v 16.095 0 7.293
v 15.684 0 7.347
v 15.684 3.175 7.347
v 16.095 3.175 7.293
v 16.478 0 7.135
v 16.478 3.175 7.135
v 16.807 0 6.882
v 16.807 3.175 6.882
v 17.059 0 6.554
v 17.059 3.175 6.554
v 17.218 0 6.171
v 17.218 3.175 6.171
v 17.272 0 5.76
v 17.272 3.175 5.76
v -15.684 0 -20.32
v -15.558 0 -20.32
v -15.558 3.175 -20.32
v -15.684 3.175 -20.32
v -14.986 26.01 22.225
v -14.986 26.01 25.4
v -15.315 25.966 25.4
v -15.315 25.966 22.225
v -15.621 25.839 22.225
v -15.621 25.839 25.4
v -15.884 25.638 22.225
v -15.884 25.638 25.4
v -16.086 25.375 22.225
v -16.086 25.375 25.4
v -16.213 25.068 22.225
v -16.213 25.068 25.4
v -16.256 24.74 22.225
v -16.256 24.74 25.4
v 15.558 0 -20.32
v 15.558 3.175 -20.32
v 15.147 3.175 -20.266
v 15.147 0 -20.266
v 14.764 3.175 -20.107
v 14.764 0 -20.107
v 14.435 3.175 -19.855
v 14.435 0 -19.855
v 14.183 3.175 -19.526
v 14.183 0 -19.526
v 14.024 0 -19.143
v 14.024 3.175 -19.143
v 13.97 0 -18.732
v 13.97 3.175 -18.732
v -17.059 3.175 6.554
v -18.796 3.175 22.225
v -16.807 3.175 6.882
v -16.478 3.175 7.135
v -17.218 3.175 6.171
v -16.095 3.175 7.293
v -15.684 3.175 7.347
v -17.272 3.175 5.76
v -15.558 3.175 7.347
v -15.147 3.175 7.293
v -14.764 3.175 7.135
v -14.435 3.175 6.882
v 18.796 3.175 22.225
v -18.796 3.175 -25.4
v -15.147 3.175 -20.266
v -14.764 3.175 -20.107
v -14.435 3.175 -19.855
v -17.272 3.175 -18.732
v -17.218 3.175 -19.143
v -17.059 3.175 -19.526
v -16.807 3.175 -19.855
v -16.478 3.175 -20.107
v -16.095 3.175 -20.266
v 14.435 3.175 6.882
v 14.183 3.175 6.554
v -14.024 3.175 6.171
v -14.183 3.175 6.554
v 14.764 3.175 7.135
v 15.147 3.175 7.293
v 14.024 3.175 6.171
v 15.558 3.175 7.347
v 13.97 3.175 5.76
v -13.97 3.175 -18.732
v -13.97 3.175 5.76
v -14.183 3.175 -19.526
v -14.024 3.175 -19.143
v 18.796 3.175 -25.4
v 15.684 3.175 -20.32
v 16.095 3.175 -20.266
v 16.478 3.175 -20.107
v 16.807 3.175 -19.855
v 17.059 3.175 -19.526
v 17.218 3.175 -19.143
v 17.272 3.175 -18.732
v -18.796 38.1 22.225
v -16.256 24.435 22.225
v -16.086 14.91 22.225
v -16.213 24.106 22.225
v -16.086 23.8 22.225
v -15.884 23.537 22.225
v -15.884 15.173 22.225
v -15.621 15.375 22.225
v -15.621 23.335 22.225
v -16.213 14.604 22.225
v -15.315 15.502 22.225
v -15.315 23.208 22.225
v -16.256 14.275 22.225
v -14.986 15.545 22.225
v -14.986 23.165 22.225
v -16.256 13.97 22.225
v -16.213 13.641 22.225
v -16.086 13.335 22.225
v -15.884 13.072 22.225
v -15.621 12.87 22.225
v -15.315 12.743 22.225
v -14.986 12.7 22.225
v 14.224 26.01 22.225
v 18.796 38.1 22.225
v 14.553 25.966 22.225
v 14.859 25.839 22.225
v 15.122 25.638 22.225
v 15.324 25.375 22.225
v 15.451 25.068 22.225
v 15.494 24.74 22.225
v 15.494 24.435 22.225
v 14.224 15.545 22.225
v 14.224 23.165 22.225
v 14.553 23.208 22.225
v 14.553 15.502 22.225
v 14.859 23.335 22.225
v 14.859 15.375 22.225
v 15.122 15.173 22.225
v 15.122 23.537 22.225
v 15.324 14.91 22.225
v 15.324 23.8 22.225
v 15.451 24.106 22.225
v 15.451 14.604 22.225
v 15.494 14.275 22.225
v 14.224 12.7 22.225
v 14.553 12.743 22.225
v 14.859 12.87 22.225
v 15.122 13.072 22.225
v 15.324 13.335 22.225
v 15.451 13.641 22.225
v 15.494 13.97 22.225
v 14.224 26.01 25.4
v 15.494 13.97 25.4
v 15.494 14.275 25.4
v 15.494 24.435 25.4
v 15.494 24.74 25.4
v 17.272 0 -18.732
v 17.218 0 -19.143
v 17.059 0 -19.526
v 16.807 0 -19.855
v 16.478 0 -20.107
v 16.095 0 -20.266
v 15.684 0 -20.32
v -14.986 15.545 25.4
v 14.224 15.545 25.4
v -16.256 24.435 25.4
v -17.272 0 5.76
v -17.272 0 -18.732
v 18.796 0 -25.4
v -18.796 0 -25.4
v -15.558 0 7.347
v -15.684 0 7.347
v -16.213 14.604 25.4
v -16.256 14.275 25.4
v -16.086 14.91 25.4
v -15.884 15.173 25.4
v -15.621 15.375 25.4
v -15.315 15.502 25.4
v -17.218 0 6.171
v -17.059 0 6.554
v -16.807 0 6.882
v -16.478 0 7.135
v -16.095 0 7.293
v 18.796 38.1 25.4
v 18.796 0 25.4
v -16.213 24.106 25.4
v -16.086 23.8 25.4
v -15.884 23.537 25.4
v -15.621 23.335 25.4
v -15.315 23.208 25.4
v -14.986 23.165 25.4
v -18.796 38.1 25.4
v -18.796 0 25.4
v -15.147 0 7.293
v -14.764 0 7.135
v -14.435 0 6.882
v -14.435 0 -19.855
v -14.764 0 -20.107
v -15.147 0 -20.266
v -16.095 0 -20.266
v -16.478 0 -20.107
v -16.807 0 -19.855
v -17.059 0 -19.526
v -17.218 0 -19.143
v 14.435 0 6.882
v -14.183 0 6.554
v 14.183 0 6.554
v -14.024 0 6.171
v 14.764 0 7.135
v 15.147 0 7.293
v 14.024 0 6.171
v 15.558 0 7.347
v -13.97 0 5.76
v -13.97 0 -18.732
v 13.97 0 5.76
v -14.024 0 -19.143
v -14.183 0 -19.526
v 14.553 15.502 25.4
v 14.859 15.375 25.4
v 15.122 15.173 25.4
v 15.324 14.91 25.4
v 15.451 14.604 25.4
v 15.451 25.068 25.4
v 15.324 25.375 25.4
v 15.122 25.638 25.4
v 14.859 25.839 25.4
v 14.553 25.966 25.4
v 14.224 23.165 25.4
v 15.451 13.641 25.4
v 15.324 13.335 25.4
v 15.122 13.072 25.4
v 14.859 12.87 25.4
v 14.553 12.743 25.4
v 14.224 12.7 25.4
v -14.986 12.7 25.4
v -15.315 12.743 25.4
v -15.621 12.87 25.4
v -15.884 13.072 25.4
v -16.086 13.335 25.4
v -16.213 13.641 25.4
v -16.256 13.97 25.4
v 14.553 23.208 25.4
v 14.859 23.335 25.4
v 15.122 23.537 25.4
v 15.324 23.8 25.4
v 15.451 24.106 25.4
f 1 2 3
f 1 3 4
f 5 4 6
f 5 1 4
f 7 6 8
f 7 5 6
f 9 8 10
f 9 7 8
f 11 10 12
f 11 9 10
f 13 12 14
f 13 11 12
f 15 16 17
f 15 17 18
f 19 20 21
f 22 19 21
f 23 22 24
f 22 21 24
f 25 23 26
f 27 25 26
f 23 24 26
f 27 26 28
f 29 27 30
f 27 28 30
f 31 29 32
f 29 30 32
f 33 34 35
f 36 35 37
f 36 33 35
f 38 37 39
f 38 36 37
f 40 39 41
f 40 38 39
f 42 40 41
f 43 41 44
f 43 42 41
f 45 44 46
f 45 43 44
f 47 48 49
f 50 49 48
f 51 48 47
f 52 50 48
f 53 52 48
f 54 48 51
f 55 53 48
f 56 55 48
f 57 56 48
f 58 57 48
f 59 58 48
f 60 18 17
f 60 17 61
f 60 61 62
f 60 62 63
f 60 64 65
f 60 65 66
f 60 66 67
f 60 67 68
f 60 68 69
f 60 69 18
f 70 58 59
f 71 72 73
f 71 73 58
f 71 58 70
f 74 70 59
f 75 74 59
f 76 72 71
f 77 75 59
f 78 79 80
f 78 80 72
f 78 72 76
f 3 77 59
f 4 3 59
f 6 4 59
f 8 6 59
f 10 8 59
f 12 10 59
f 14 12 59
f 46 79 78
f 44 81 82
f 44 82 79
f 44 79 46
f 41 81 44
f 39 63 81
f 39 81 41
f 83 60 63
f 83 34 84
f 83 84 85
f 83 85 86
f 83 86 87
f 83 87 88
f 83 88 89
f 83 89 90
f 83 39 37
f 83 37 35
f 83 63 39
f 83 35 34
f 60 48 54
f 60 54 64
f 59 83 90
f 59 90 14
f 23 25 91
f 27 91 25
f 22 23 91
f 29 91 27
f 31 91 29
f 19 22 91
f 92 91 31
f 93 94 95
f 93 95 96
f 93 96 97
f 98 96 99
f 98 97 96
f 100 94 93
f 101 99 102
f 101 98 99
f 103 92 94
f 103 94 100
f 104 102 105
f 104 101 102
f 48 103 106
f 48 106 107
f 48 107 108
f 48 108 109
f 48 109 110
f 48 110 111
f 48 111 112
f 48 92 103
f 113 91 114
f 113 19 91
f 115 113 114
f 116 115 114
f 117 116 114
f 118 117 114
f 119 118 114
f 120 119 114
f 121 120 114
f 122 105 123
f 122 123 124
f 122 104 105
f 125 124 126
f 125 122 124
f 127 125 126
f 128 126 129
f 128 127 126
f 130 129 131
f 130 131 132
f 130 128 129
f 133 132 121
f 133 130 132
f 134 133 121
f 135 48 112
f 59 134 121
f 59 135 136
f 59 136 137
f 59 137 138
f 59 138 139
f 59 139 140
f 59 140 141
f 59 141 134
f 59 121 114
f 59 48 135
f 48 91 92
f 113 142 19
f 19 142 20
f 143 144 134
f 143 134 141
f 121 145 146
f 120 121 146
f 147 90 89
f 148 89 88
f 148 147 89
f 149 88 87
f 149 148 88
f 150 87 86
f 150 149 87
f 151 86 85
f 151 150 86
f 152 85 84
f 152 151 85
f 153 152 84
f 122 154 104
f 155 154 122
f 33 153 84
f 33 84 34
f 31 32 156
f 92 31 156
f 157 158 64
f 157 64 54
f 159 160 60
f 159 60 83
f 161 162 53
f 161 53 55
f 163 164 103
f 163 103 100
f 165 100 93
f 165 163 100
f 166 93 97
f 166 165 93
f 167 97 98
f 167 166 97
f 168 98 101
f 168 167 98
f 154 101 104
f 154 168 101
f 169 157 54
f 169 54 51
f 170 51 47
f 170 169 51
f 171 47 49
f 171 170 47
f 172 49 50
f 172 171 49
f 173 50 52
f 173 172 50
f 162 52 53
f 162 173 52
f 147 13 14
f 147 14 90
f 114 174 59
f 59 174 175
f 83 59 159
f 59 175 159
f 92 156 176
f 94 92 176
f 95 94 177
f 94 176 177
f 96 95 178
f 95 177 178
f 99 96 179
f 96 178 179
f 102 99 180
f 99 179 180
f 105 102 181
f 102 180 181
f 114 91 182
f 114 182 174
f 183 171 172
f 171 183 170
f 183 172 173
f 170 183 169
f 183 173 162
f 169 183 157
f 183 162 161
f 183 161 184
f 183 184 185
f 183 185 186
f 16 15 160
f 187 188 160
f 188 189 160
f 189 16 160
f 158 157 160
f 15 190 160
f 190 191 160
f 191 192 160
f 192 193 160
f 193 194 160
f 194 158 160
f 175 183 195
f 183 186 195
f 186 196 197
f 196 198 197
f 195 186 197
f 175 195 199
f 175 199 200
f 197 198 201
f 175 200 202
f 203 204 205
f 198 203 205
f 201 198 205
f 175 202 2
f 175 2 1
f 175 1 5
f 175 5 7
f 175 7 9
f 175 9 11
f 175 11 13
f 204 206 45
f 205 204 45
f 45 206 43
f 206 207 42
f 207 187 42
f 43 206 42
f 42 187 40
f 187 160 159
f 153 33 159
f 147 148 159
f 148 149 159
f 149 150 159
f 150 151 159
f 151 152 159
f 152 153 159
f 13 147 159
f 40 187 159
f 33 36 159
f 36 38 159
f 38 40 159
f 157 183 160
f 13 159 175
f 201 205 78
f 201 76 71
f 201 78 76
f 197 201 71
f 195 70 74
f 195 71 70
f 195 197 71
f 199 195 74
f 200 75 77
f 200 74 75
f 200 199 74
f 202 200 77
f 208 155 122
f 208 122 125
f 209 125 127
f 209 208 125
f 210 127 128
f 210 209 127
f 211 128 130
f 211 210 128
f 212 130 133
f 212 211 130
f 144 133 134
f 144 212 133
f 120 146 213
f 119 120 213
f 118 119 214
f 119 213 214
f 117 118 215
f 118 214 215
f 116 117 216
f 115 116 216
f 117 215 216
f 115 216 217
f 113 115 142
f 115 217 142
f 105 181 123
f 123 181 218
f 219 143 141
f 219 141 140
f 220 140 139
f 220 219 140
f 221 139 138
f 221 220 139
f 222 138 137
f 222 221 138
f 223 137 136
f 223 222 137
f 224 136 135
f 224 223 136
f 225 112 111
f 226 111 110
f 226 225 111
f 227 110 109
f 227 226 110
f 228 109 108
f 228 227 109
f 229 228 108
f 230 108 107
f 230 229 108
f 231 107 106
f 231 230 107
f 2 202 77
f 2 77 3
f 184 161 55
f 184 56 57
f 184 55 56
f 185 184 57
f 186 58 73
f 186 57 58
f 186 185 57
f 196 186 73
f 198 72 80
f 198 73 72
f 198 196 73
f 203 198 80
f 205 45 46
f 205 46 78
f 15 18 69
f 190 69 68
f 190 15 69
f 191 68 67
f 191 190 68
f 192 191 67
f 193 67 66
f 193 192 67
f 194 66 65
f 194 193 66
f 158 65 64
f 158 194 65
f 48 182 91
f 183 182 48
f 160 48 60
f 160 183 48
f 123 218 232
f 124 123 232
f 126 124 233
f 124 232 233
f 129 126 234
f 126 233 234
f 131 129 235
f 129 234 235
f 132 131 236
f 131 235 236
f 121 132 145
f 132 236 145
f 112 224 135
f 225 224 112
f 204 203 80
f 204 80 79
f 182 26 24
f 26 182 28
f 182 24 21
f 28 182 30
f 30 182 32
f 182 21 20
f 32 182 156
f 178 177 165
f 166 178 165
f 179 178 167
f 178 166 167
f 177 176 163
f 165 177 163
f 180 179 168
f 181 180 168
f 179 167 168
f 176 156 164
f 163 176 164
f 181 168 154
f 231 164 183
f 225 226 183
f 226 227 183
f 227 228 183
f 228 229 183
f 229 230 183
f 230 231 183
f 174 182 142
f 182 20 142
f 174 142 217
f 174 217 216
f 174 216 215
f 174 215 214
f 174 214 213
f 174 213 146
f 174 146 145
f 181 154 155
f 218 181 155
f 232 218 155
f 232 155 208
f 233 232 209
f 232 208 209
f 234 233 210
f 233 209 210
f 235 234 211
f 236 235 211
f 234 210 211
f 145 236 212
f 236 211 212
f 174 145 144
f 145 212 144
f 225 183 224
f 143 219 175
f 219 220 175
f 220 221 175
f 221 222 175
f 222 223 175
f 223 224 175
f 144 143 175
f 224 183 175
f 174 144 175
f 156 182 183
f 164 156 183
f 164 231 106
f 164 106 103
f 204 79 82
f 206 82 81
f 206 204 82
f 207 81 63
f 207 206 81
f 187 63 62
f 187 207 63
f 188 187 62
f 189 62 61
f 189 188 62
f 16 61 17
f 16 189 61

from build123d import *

# Parameters (mm, degrees)
SKETCH1_W           = 37.592
SKETCH1_H           = 50.8
BOSS_EXTRUDE1_DEPTH = 3.175
SKETCH2_W           = 37.592
SKETCH2_H           = 3.175
BOSS_EXTRUDE2_DEPTH = 34.925
CUT_EXTRUDE1_REACH  = 52.8
CUT_EXTRUDE2_REACH  = 40.1


with BuildPart() as part:
    # Sketch1 → Boss-Extrude1 (new body)
    with BuildSketch(Plane(origin=(0, 0, 0), x_dir=(1, 0, 0), z_dir=(0, 1, 0))):
        Rectangle(SKETCH1_W, SKETCH1_H)
    extrude(amount=BOSS_EXTRUDE1_DEPTH)

    # Sketch2 → Boss-Extrude2 (add)
    with BuildSketch(Plane(origin=(0, 3.175, 0), x_dir=(1, 0, 0), z_dir=(0, 1, 0))):
        with Locations((0, -23.8125)):
            Rectangle(SKETCH2_W, SKETCH2_H)
    extrude(amount=BOSS_EXTRUDE2_DEPTH)

    # Sketch3 → Cut-Extrude1 (cut, up to next)
    with BuildSketch(Plane.XY.offset(25.4), mode=Mode.PRIVATE) as cut_extrude1_sk1:
        with BuildLine():
            Line((14.224, 12.7), (-14.986, 12.7))
            ThreePointArc((-14.986, 12.7), (-15.884025612, 13.071974388), (-16.256, 13.97))
            Line((-16.256, 13.97), (-16.256, 14.2748))
            ThreePointArc((-16.256, 14.2748), (-15.884025612, 15.172825612), (-14.986, 15.5448))
            Line((-14.986, 15.5448), (14.224, 15.5448))
            ThreePointArc((14.224, 15.5448), (15.122025612, 15.172825612), (15.494, 14.2748))
            Line((15.494, 14.2748), (15.494, 13.97))
            ThreePointArc((15.494, 13.97), (15.122025612, 13.071974388), (14.224, 12.7))
        make_face()
    cut_extrude1_tool1 = extrude(cut_extrude1_sk1.sketch, amount=-CUT_EXTRUDE1_REACH, mode=Mode.PRIVATE) & part.part
    add(cut_extrude1_tool1.solids().sort_by_distance((-0.381, 14.1224, 25.4))[0], mode=Mode.SUBTRACT)
    # Sketch3 → Cut-Extrude1 (cut, up to next)
    with BuildSketch(Plane.XY.offset(25.4), mode=Mode.PRIVATE) as cut_extrude1_sk2:
        with BuildLine():
            Line((-14.986, 23.1648), (14.224, 23.1648))
            ThreePointArc((14.224, 23.1648), (15.122025612, 23.536774388), (15.494, 24.4348))
            Line((15.494, 24.4348), (15.494, 24.7396))
            ThreePointArc((15.494, 24.7396), (15.122025612, 25.637625612), (14.224, 26.0096))
            Line((14.224, 26.0096), (-14.986, 26.0096))
            ThreePointArc((-14.986, 26.0096), (-15.884025612, 25.637625612), (-16.256, 24.7396))
            Line((-16.256, 24.7396), (-16.256, 24.4348))
            ThreePointArc((-16.256, 24.4348), (-15.884025612, 23.536774388), (-14.986, 23.1648))
        make_face()
    cut_extrude1_tool2 = extrude(cut_extrude1_sk2.sketch, amount=-CUT_EXTRUDE1_REACH, mode=Mode.PRIVATE) & part.part
    add(cut_extrude1_tool2.solids().sort_by_distance((-0.381, 24.5872, 25.4))[0], mode=Mode.SUBTRACT)

    # Sketch4 → Cut-Extrude2 (cut, up to next)
    with BuildSketch(Plane.XZ, mode=Mode.PRIVATE) as cut_extrude2_sk1:
        with BuildLine():
            Line((-15.5575, -20.32), (-15.6845, -20.32))
            ThreePointArc((-15.6845, -20.32), (-16.807032015, -19.855032015), (-17.272, -18.7325))
            Line((-17.272, -18.7325), (-17.272, 5.759956222))
            ThreePointArc((-17.272, 5.759956222), (-16.807032015, 6.882488237), (-15.6845, 7.347456222))
            Line((-15.6845, 7.347456222), (-15.5575, 7.347456222))
            ThreePointArc((-15.5575, 7.347456222), (-14.434967985, 6.882488237), (-13.97, 5.759956222))
            Line((-13.97, 5.759956222), (-13.97, -18.7325))
            ThreePointArc((-13.97, -18.7325), (-14.434967985, -19.855032015), (-15.5575, -20.32))
        make_face()
    cut_extrude2_tool1 = extrude(cut_extrude2_sk1.sketch, amount=-CUT_EXTRUDE2_REACH, mode=Mode.PRIVATE) & part.part
    add(cut_extrude2_tool1.solids().sort_by_distance((-15.621, 0, -6.486272))[0], mode=Mode.SUBTRACT)
    # Sketch4 → Cut-Extrude2 (cut, up to next)
    with BuildSketch(Plane.XZ, mode=Mode.PRIVATE) as cut_extrude2_sk2:
        with BuildLine():
            Line((15.6845, -20.32), (15.5575, -20.32))
            ThreePointArc((15.5575, -20.32), (14.434967985, -19.855032015), (13.97, -18.7325))
            Line((13.97, -18.7325), (13.97, 5.759956222))
            ThreePointArc((13.97, 5.759956222), (14.434967985, 6.882488237), (15.5575, 7.347456222))
            Line((15.5575, 7.347456222), (15.6845, 7.347456222))
            ThreePointArc((15.6845, 7.347456222), (16.807032015, 6.882488237), (17.272, 5.759956222))
            Line((17.272, 5.759956222), (17.272, -18.7325))
            ThreePointArc((17.272, -18.7325), (16.807032015, -19.855032015), (15.6845, -20.32))
        make_face()
    cut_extrude2_tool2 = extrude(cut_extrude2_sk2.sketch, amount=-CUT_EXTRUDE2_REACH, mode=Mode.PRIVATE) & part.part
    add(cut_extrude2_tool2.solids().sort_by_distance((15.621, 0, -6.486272))[0], mode=Mode.SUBTRACT)


solid = part.part
